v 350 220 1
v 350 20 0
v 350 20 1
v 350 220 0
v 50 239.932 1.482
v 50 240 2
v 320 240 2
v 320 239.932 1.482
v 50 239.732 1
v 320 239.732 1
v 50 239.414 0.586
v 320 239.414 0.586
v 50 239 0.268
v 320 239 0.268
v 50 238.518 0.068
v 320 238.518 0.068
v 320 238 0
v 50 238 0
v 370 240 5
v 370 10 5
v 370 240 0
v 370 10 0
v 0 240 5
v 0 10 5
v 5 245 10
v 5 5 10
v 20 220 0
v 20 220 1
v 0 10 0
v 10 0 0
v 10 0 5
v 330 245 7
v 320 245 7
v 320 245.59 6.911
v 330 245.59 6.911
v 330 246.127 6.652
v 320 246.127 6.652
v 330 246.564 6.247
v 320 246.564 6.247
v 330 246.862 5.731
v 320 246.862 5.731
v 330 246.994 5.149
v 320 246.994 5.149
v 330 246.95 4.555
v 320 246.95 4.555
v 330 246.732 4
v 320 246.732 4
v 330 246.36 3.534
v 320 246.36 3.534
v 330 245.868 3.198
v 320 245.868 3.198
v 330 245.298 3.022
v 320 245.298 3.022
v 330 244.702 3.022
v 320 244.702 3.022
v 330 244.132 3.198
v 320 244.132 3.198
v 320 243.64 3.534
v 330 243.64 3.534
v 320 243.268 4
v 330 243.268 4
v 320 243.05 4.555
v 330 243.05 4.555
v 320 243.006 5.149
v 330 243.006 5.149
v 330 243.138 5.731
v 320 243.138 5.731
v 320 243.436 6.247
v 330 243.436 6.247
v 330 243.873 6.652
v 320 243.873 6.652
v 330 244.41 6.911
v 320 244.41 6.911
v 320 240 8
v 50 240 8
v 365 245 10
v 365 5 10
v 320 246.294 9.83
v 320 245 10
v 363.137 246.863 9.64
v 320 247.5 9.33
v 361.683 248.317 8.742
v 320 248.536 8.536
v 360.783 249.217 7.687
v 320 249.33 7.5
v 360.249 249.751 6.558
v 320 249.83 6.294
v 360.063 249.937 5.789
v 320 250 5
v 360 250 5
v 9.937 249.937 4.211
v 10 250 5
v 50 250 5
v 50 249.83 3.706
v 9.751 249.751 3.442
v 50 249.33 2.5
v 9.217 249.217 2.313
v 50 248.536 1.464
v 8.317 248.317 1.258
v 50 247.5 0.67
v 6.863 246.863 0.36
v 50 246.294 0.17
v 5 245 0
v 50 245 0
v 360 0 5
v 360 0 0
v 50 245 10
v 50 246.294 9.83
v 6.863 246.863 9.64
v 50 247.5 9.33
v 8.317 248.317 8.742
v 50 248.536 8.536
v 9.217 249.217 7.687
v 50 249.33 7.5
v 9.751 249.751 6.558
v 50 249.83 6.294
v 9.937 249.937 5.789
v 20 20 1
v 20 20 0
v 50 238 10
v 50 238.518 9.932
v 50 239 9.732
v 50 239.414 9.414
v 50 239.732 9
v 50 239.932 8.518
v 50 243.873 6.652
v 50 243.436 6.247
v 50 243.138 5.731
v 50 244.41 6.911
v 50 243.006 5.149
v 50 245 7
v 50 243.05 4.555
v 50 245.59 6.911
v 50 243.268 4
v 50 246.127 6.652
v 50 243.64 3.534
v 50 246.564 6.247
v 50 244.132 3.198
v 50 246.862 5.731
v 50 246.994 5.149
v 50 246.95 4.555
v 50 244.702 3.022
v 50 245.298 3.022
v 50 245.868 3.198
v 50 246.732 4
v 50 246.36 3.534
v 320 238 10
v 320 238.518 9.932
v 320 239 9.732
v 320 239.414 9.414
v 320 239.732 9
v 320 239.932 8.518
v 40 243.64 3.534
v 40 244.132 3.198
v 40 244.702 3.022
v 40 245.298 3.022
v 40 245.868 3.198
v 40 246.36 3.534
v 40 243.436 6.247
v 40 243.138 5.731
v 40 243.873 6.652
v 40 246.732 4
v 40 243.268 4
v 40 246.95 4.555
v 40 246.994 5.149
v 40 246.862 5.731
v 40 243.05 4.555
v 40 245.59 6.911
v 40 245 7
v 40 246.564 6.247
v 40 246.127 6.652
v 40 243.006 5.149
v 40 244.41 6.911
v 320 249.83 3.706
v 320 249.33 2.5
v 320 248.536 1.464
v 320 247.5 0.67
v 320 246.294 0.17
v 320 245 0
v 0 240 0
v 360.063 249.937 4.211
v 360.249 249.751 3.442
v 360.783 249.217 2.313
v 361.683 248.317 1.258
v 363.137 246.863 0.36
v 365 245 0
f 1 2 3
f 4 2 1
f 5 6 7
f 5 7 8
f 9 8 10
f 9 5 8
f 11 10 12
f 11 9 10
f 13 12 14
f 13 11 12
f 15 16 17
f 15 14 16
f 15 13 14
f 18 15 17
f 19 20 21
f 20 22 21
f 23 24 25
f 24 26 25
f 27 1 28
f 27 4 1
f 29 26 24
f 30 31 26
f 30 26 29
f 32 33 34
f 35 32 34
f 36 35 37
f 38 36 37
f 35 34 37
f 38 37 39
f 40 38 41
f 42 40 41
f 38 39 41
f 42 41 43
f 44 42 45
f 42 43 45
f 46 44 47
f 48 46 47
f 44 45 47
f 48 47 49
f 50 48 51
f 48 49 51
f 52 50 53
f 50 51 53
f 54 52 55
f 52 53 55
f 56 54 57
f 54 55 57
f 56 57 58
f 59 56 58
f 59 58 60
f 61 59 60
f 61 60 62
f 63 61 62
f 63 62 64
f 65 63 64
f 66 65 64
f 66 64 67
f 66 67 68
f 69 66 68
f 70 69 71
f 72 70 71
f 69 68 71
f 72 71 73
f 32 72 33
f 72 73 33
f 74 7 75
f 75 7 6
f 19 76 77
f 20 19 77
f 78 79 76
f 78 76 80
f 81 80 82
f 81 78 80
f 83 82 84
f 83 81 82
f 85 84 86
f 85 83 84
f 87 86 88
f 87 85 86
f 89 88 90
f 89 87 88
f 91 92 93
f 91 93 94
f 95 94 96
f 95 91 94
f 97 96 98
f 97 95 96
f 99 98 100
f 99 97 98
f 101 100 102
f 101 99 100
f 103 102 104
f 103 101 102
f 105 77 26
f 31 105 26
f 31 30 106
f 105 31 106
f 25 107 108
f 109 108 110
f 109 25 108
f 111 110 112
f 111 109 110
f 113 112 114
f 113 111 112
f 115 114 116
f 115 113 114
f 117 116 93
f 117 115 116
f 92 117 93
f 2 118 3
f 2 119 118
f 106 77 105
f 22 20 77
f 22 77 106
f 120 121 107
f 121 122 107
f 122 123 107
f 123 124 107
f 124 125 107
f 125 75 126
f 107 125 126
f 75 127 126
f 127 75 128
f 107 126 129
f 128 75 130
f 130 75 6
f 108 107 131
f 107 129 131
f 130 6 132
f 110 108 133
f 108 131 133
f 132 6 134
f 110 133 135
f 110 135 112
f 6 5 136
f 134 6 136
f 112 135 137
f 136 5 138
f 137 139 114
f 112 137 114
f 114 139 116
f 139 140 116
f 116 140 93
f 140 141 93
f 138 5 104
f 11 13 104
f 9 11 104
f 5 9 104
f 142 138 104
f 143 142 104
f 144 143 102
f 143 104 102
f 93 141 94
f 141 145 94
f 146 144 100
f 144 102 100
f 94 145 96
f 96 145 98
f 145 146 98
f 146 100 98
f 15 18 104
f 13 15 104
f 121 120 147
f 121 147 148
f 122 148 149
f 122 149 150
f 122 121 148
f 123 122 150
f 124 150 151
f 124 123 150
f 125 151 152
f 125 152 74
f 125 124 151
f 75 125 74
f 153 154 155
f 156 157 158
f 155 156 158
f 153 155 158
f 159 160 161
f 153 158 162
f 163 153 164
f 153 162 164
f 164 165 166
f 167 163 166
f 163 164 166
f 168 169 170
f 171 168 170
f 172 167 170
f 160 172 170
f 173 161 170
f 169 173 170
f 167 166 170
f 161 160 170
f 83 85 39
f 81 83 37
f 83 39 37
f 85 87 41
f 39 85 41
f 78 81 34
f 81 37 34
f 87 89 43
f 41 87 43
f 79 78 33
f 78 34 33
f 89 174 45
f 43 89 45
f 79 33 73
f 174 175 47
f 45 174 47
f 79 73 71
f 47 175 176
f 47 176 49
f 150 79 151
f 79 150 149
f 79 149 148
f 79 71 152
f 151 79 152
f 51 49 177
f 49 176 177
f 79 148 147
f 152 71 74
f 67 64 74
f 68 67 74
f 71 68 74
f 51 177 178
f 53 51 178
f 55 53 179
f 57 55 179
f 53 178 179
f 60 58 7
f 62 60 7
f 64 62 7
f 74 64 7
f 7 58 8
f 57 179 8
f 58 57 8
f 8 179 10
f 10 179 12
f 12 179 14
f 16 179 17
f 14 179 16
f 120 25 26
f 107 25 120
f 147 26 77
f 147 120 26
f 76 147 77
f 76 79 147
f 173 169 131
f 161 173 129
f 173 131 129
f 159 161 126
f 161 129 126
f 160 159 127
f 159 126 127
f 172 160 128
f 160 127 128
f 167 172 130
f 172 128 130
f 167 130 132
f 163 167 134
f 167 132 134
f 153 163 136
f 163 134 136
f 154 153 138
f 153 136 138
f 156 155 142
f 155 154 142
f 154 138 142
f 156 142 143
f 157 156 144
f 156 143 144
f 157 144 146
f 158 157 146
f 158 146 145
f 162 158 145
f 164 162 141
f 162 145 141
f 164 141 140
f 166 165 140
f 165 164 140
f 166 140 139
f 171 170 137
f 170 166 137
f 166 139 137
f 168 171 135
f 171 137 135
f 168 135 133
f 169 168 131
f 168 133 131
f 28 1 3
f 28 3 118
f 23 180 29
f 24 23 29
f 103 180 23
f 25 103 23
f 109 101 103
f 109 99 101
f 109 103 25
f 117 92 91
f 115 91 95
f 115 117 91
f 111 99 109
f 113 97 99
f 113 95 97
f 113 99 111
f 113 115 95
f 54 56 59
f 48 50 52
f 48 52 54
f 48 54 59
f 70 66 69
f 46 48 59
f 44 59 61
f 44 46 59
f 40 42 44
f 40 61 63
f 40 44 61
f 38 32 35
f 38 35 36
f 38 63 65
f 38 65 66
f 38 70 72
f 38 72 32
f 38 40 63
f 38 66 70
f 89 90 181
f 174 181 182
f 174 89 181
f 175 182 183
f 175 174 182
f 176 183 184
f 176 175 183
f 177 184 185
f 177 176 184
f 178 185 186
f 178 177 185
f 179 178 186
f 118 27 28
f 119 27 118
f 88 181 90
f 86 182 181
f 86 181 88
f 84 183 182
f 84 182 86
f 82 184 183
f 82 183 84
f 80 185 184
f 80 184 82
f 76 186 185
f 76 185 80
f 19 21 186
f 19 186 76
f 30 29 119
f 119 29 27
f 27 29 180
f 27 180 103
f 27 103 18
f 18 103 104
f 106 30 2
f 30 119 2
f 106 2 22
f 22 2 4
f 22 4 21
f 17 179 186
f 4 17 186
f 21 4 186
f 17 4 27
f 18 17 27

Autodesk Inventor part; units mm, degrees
ref_plane "YZ Plane" through (0, 0, 0) normal (1, 0, 0) x (0, 1, 0)
ref_plane "XZ Plane" through (0, 0, 0) normal (0, 1, 0) x (-1, 0, 0)
ref_plane "XY Plane" through (0, 0, 0) normal (0, 0, 1) x (1, 0, 0)
sketch "スケッチ1" plane through (0, 0, 0) normal (0, 0, 1) x (1, 0, 0)
  line L0 (0, 0) -> (370, 0)
  line L1 (370, 0) -> (370, 250)
  line L2 (370, 250) -> (320, 250)
  line L3 (320, 250) -> (320, 240)
  line L4 (320, 240) -> (50, 240)
  line L5 (50, 240) -> (50, 250)
  line L6 (50, 250) -> (0, 250)
  line L7 (0, 250) -> (0, 0)
  dimension "d0" = 50
  dimension "d1" = 10
  dimension "d2" = 250
  dimension "d3" = 370
extrude "押し出し1" add sketch "スケッチ1" along normal blind 10
chamfer "面取り1" distance 5 angle 45 3 edges at (185, 0, 10) (0, 125, 10) (370, 125, 10)
chamfer "面取り2" distance 10 angle 45 4 edges at (0, 0, 2.5) (370, 0, 2.5) (370, 250, 2.5) (0, 250, 2.5)
fillet "フィレット2" radius 5 4 edges at (30, 250, 10) (30, 250, 0) (340, 250, 10) (340, 250, 0)
sketch "スケッチ2" plane through (320, 240, 0) normal (-1, 0, 0) x (0, 0, 1)
  arc A0 (10, 5) -> (0, 5) centre (5, 5) ccw projected
  circle A1 centre (5, 5) radius 2
  point P0 (0, -240)
  dimension "d14" = 4
extrude "押し出し2" cut sketch "スケッチ2" along normal blind 280 and the other way blind 10
fillet "フィレット3" radius 2 2 edges at (185, 240, 10) (185, 240, 0)
sketch "スケッチ3" plane through (0, 0, 0) normal (0, 0, -1) x (-1, 0, 0)
  line L0 (-10, 0) -> (-360, 0) projected
  line L1 (-185, 0) -> (-185, 240) construction
  line L2 (-50, 240) -> (-320, 240) projected
  line L3 (-20, 20) -> (-350, 20)
  line L4 (-350, 20) -> (-350, 220)
  line L5 (-350, 220) -> (-20, 220)
  line L6 (-20, 220) -> (-20, 20)
  line L7 (-20, 20) -> (-350, 220) construction
  line L8 (-350, 20) -> (-20, 220) construction
  line L9 (-370, 10) -> (-370, 240) projected
  point P0 (0, 0)
  point P1 (-185, 120)
  dimension "d20" = 20
  dimension "d21" = 20
  dimension "d22" = 200
extrude "押し出し3" cut sketch "スケッチ3" against normal blind 1
properties part number "PCパーツ2"
